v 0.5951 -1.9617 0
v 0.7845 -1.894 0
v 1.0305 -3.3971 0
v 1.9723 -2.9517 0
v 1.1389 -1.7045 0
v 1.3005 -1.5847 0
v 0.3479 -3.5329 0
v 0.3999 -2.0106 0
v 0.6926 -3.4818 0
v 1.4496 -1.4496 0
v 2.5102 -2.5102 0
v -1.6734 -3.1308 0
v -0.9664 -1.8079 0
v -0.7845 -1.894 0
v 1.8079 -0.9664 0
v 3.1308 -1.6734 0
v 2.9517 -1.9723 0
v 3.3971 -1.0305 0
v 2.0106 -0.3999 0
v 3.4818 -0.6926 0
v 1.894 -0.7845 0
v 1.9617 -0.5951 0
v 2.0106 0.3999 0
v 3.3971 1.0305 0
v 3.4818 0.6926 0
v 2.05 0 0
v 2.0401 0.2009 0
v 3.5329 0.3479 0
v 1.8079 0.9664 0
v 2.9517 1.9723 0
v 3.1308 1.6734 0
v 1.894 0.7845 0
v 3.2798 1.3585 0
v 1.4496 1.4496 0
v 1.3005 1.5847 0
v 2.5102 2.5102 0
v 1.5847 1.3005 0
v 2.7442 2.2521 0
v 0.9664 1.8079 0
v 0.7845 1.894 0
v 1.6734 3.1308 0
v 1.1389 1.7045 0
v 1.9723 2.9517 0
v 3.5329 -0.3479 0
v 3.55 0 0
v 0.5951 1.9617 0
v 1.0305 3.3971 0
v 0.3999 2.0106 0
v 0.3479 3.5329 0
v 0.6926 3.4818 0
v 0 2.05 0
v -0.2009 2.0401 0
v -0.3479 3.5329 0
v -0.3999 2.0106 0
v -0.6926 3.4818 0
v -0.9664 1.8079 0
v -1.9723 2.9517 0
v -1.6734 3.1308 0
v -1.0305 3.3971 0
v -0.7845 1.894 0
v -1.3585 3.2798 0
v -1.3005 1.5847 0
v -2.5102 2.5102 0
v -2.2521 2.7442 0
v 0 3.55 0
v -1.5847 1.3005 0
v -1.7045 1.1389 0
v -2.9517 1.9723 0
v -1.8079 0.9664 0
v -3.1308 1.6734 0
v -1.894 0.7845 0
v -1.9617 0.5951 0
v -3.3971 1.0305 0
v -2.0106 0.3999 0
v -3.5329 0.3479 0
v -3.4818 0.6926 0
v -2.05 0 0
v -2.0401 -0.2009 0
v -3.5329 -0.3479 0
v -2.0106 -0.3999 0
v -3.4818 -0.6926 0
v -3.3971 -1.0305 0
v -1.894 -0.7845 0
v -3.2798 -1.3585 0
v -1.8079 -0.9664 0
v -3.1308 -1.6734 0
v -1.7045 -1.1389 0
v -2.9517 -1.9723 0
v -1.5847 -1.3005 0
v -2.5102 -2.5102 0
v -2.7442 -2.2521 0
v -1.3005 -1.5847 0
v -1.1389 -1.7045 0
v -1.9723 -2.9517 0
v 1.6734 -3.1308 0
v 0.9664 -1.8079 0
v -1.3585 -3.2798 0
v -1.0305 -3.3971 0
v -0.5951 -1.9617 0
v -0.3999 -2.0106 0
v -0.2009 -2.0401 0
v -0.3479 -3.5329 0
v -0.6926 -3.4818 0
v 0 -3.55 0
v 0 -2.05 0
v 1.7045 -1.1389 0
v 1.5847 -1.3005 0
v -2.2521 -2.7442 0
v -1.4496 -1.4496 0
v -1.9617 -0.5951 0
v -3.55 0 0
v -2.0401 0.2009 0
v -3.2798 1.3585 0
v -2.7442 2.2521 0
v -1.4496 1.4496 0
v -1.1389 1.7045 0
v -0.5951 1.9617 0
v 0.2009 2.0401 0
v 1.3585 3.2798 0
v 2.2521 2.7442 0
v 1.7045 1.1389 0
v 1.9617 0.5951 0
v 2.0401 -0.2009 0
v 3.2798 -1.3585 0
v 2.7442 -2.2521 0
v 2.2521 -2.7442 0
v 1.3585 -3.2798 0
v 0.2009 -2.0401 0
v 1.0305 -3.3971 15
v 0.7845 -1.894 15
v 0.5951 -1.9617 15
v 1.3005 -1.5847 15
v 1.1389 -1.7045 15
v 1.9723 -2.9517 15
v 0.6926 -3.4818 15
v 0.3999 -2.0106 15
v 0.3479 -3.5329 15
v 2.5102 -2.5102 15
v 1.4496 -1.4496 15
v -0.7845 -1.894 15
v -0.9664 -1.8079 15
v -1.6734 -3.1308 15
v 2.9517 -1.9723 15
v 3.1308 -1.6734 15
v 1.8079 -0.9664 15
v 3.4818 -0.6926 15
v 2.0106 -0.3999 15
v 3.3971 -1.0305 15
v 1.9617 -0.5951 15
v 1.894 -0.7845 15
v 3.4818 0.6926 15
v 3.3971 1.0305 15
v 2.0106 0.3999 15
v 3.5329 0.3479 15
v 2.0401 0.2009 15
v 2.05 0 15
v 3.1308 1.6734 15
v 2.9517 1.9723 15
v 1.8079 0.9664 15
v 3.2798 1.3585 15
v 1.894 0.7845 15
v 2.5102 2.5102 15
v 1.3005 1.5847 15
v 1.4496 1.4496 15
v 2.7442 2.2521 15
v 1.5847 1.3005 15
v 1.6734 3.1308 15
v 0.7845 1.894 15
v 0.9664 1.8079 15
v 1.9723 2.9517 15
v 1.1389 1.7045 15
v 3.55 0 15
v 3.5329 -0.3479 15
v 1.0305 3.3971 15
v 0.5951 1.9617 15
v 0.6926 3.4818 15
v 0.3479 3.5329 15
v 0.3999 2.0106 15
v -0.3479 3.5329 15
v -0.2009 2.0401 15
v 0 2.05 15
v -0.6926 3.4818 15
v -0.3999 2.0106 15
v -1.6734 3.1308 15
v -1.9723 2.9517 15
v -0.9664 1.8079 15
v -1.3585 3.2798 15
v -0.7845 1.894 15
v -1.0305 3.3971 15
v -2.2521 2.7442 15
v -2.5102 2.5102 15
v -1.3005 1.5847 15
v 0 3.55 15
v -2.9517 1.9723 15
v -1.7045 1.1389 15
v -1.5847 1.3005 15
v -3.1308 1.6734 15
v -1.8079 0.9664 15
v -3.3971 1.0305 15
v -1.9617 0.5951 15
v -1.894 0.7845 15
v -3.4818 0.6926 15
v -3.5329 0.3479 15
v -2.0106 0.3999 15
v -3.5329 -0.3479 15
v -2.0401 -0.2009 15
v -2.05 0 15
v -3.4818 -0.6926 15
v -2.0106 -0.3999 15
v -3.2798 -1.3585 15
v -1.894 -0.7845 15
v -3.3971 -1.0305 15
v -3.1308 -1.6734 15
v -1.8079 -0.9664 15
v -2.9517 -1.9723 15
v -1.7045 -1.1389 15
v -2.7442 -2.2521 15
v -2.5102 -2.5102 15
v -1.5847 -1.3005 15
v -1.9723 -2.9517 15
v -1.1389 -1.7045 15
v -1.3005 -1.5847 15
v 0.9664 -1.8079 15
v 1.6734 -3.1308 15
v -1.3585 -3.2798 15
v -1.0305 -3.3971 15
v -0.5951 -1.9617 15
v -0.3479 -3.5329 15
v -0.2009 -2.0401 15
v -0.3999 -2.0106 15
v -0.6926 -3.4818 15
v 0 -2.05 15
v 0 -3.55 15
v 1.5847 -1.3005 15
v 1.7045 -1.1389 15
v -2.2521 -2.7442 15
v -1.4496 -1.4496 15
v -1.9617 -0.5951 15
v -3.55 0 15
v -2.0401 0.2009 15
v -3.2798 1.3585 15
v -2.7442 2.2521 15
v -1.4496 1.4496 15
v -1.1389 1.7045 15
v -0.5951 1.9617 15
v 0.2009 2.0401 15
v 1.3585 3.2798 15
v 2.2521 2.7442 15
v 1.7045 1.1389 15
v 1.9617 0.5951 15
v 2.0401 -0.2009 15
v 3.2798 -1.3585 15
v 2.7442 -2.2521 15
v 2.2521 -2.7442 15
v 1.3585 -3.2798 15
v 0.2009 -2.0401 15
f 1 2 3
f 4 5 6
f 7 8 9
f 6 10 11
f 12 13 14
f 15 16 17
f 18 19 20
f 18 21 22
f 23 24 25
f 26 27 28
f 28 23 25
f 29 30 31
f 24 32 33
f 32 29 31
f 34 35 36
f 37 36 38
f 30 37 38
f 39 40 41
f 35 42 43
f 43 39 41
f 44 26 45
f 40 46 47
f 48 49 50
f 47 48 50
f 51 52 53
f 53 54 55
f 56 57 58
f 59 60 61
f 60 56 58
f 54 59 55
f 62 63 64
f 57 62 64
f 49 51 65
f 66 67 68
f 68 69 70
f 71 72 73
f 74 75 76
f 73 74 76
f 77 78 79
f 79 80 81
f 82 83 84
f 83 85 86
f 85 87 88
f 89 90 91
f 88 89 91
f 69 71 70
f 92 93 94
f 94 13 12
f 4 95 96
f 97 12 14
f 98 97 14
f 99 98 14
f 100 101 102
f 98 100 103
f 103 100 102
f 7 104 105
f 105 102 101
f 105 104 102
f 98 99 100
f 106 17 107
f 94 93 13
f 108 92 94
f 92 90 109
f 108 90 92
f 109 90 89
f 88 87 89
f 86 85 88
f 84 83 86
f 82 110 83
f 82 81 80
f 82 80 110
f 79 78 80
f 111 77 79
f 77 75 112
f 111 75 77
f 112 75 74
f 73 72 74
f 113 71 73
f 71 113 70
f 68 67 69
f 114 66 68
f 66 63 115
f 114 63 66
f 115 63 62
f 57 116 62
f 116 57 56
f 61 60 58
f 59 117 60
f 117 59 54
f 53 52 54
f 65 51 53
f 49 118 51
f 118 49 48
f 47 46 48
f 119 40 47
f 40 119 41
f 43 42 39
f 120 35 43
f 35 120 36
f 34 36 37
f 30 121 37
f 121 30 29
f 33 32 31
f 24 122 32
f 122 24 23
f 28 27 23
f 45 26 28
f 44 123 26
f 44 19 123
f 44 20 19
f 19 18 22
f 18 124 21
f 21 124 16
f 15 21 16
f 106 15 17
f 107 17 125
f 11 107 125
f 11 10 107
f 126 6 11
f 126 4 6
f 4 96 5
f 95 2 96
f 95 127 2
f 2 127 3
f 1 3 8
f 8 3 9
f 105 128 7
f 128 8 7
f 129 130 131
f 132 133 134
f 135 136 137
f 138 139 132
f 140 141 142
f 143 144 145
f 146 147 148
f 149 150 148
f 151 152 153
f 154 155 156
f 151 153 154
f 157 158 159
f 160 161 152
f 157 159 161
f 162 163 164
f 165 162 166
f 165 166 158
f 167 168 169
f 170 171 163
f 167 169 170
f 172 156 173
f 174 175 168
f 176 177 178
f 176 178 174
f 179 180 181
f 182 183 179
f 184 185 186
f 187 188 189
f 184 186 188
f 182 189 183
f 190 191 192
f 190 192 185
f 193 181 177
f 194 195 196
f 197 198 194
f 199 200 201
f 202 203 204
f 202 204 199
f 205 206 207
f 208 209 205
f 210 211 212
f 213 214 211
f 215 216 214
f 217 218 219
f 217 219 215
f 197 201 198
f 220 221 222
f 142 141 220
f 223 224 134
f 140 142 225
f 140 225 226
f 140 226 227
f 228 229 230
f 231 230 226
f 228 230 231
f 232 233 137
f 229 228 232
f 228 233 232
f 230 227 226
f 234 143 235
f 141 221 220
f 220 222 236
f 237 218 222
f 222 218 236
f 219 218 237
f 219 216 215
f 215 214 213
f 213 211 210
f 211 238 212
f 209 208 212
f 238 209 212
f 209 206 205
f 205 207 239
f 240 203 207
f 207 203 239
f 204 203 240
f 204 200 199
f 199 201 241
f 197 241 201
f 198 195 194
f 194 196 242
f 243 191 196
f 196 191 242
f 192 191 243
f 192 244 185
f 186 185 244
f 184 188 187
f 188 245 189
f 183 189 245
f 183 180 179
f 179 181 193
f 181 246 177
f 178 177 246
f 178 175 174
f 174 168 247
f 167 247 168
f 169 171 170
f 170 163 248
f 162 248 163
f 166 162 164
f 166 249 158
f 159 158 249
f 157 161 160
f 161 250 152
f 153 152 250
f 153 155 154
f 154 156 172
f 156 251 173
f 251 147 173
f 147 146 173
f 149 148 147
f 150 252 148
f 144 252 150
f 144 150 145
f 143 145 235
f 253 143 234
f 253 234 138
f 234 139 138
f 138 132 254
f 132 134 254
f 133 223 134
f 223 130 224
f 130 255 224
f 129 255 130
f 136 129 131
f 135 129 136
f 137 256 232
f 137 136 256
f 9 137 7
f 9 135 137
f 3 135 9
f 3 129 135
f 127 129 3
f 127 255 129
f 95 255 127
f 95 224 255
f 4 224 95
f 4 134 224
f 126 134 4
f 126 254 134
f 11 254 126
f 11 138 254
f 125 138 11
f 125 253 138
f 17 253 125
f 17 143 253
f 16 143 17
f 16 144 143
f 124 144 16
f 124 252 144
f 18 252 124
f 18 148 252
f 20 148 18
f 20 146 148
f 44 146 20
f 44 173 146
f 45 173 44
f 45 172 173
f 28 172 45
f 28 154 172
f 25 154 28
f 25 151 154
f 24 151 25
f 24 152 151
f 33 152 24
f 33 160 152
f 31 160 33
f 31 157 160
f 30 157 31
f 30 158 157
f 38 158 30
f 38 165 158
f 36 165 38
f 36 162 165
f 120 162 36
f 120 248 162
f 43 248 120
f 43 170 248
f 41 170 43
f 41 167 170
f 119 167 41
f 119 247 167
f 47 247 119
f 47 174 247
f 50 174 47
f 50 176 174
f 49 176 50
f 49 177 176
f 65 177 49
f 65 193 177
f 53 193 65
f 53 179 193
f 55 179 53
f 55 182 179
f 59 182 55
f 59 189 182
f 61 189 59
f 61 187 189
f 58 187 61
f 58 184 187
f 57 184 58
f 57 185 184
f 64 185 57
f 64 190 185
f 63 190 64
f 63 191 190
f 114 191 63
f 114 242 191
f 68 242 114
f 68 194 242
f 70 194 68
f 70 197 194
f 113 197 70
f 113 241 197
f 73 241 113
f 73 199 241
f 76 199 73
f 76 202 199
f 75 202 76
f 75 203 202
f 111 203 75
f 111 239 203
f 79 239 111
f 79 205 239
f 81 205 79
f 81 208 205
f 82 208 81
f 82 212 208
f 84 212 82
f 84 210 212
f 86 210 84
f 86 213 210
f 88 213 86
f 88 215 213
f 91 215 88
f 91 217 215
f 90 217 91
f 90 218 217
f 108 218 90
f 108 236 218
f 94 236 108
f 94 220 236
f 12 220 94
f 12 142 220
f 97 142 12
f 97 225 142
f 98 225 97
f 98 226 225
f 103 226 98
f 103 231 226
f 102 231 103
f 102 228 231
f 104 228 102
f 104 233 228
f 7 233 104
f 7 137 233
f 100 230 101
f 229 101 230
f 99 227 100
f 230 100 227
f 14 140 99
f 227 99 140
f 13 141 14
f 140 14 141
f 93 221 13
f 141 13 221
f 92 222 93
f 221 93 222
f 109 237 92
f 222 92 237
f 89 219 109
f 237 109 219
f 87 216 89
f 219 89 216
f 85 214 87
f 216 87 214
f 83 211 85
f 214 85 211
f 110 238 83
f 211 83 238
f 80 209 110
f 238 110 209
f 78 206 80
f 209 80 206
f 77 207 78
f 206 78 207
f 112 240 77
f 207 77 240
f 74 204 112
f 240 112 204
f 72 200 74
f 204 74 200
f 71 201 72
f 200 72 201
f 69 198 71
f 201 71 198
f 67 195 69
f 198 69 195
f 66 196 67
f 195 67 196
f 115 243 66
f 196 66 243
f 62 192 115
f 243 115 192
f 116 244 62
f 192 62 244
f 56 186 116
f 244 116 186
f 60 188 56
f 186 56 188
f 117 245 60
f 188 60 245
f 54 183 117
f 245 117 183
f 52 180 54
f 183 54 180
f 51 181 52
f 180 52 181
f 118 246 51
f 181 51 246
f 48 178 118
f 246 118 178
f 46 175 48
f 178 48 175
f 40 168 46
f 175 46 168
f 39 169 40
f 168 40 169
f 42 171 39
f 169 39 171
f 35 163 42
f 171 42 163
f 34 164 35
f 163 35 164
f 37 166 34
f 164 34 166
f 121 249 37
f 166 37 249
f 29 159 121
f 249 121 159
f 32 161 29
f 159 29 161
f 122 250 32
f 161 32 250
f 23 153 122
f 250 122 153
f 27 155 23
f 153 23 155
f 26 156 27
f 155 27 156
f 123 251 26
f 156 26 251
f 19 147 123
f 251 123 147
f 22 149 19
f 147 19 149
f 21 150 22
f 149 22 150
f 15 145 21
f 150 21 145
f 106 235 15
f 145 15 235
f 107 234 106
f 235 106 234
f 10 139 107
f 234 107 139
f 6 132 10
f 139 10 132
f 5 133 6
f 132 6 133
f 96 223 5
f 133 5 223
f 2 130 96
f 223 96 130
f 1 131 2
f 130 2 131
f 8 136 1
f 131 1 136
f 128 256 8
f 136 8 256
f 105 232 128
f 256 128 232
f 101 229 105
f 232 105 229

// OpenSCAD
linear_extrude(15, $fn = 64)
difference() {
    circle(d = 7.1);
    circle(d = 4.1);
}
    
